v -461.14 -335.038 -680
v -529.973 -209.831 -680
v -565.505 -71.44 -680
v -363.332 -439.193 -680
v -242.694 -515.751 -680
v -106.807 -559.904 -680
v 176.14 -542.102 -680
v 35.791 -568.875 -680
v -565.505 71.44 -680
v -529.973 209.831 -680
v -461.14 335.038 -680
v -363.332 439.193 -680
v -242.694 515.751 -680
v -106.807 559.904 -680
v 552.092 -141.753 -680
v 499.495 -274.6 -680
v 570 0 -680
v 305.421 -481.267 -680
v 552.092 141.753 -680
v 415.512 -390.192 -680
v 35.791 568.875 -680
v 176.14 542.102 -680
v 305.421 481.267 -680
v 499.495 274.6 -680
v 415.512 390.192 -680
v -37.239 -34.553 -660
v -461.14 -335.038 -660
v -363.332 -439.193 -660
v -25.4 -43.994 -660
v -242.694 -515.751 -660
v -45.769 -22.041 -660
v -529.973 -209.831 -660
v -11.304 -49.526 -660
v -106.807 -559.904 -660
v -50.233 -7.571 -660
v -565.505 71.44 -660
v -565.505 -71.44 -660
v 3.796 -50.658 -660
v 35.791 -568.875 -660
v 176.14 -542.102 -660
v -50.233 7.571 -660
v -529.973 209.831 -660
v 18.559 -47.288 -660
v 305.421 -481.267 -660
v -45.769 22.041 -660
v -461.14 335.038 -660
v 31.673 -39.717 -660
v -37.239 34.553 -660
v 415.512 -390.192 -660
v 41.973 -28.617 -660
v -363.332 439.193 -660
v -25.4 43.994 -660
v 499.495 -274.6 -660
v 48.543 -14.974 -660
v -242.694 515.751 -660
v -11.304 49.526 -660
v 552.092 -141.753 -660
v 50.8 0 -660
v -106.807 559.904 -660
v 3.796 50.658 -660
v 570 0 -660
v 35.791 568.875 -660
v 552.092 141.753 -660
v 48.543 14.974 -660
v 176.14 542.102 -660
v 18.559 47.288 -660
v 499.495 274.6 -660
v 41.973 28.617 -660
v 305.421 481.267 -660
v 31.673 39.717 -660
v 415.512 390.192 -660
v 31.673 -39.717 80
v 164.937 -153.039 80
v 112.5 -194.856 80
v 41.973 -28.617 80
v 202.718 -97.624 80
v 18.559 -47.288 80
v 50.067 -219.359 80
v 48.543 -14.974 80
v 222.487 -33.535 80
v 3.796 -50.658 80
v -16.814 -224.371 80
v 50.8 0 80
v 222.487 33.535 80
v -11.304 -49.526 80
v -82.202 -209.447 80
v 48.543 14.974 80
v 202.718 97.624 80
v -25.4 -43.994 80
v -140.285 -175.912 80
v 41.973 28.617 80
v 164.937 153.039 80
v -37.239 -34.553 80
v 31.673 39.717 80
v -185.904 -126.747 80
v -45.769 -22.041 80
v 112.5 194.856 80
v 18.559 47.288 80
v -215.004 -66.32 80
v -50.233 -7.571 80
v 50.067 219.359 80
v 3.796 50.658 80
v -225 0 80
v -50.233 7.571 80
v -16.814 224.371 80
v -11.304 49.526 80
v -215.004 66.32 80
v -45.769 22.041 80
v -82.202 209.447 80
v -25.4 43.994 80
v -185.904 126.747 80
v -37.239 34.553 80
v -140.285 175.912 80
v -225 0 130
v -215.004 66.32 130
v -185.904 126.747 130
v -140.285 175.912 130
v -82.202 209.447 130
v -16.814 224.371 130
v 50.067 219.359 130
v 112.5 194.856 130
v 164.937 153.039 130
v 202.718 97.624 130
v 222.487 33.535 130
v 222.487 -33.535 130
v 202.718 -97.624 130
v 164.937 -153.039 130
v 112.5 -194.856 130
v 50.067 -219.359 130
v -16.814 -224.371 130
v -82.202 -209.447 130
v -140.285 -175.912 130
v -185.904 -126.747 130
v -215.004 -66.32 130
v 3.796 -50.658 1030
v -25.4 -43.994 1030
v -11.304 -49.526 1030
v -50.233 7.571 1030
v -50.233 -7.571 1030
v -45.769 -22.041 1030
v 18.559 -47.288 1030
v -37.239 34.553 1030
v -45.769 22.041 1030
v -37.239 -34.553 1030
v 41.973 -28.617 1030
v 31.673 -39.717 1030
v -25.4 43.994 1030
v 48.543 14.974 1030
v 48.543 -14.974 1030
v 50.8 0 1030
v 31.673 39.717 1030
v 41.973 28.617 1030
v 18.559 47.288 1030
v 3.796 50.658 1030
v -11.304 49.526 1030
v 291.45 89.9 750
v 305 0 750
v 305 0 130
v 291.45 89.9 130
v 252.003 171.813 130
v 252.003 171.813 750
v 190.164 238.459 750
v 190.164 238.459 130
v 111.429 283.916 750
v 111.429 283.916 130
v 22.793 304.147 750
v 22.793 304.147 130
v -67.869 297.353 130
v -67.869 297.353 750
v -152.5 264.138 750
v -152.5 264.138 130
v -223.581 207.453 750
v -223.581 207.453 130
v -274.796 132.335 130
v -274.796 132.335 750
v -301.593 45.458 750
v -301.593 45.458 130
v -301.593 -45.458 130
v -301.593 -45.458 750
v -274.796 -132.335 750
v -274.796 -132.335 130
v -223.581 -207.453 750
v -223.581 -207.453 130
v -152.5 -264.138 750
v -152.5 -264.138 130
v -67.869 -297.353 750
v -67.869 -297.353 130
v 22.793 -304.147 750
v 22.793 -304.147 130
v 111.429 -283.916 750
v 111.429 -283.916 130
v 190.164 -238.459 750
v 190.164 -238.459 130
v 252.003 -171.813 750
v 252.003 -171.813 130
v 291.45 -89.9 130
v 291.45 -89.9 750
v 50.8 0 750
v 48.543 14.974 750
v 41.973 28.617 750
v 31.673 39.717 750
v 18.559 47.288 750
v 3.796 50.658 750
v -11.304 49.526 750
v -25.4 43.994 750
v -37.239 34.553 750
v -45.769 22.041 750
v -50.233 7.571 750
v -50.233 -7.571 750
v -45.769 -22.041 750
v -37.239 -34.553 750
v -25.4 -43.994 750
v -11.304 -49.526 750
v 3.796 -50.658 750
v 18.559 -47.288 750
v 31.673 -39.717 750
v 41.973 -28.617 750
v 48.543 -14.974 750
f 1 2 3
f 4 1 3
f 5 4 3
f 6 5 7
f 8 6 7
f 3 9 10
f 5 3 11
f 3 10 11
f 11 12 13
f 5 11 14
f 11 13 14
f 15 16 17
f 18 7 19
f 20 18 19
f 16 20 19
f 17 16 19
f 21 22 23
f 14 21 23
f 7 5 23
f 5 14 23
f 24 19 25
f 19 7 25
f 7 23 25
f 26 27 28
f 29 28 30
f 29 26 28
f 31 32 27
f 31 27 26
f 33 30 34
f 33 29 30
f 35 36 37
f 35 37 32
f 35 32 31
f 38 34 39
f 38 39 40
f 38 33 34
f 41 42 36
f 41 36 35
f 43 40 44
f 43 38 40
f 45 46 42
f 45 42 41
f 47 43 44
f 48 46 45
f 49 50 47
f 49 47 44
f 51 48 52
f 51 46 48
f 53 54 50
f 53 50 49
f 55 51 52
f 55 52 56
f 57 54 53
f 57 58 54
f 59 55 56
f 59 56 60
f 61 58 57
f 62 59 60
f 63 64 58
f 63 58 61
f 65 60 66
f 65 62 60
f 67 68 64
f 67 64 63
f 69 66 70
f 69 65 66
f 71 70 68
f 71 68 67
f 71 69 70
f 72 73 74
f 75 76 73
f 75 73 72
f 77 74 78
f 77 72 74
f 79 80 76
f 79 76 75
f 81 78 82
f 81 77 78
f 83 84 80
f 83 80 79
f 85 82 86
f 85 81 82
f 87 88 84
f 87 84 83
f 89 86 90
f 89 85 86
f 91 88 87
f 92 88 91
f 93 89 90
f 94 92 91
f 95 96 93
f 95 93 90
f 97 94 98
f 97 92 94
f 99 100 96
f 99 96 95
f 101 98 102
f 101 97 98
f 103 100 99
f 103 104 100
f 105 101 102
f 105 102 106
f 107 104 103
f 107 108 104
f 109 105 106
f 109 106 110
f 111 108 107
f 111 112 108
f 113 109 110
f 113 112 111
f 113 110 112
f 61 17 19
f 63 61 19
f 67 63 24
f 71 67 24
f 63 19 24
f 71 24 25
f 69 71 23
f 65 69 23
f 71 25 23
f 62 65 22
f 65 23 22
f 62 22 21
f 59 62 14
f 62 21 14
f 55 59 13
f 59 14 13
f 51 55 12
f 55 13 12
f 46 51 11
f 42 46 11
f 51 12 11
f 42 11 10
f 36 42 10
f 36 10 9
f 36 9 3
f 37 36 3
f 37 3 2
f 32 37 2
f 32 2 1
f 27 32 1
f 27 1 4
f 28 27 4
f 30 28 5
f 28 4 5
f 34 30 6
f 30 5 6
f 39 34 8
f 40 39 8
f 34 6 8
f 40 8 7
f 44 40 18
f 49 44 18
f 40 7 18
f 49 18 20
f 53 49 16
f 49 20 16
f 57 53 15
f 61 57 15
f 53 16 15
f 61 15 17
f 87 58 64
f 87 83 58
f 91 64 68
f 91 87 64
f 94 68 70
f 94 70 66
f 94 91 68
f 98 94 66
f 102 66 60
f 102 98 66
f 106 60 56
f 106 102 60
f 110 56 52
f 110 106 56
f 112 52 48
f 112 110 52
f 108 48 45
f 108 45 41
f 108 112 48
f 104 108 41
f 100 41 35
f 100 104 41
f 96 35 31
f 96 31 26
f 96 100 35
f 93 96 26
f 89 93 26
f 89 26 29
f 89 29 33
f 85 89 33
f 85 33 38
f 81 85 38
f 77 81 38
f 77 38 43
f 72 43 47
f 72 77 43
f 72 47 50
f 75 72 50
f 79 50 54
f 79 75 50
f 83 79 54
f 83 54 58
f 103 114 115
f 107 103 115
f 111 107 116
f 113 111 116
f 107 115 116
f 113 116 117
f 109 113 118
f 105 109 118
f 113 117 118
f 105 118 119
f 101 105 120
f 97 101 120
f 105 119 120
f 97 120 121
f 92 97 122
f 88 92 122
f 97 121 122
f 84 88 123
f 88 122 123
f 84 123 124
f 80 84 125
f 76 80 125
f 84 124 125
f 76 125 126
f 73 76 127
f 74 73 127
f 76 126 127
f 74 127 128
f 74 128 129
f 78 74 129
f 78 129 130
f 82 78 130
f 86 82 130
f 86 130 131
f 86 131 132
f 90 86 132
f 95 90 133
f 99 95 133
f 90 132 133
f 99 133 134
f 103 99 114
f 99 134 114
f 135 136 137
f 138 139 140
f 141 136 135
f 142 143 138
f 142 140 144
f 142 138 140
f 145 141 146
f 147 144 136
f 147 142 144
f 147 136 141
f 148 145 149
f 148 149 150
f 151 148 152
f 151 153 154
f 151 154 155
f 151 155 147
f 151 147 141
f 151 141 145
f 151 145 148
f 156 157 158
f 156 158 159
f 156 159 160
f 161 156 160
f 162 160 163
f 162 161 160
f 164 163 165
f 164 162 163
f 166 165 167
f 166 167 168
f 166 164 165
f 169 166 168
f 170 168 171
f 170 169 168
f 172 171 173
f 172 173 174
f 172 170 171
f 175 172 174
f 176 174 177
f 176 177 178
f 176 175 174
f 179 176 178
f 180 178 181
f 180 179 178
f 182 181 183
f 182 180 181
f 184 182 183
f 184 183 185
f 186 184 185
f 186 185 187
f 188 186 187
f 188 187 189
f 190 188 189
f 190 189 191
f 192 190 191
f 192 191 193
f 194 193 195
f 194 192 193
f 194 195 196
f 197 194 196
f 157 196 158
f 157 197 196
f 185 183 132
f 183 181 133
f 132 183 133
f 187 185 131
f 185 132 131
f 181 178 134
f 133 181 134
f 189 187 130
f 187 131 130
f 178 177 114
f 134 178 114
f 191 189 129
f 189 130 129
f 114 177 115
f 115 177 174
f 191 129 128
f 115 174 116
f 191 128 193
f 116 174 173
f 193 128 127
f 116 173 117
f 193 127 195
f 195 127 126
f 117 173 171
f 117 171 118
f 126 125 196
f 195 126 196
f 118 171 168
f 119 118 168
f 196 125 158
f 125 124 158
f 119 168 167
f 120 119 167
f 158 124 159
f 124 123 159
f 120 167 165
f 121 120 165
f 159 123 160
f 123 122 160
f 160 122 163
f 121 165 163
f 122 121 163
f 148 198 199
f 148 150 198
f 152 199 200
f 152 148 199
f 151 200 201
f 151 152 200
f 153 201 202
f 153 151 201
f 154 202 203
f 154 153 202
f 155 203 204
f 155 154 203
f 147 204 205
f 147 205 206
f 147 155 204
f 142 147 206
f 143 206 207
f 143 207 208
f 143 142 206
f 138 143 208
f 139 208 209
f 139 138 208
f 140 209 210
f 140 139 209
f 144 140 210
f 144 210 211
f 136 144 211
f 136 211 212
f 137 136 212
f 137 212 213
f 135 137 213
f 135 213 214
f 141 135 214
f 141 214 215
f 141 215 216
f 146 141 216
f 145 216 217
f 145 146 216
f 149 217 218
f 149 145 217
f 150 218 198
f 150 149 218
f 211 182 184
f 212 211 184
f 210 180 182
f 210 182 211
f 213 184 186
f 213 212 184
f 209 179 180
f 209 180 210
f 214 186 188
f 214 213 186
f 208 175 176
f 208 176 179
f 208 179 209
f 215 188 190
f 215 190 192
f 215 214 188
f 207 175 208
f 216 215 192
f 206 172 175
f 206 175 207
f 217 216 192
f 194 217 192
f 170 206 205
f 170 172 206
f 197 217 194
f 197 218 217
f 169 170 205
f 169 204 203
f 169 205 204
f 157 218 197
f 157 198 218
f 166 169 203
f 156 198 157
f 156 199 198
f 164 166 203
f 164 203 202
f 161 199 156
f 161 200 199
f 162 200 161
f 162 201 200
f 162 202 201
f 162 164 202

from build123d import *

# Parameters (mm, degrees)
SKETCH1_R                = 50.8
BOSS_EXTRUDE1_DEPTH      = 1030
BOSS_EXTRUDE1_DEPTH_BACK = 680
SKETCH2_R                = 570
BOSS_EXTRUDE2_DEPTH      = 20
BOSS_EXTRUDE3_START      = -280
SKETCH7_R                = 305
BOSS_EXTRUDE3_DEPTH      = 620
SKETCH8_R                = 225
BOSS_EXTRUDE4_DEPTH      = 50


with BuildPart() as part:
    # Sketch1 → Boss-Extrude1 (new body, two sides)
    with BuildSketch(Plane.XY) as boss_extrude1_sk:
        Circle(SKETCH1_R)
    extrude(amount=BOSS_EXTRUDE1_DEPTH)
    extrude(boss_extrude1_sk.sketch, amount=-BOSS_EXTRUDE1_DEPTH_BACK)

    # Sketch2 → Boss-Extrude2 (add)
    with BuildSketch(Plane.XY.offset(-680)):
        Circle(SKETCH2_R)
    extrude(amount=BOSS_EXTRUDE2_DEPTH)

    # Sketch7 → Boss-Extrude3 (add)
    with BuildSketch(Plane.XY.offset(1030).offset(BOSS_EXTRUDE3_START)):
        Circle(SKETCH7_R)
    extrude(amount=-BOSS_EXTRUDE3_DEPTH)

    # Sketch8 → Boss-Extrude4 (add)
    with BuildSketch(Plane(origin=(0, 0, 130), x_dir=(-1, 0, 0), z_dir=(0, 0, -1))):
        Circle(SKETCH8_R)
    extrude(amount=BOSS_EXTRUDE4_DEPTH)


solid = part.part
